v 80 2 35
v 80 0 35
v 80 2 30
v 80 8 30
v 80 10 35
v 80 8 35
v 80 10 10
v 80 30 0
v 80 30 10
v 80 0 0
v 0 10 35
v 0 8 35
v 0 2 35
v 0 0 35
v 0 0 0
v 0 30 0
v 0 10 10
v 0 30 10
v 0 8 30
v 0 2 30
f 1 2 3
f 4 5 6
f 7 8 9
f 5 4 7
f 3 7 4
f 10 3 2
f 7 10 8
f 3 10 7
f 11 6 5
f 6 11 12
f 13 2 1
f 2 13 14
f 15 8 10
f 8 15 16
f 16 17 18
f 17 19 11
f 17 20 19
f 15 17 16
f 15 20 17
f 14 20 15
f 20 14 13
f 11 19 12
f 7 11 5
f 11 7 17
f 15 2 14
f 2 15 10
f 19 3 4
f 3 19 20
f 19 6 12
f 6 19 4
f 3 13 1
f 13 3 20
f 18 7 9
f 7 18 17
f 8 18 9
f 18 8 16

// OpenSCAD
difference(){
    cube([80,10,35]);
    translate([0,2,30]) cube([80,6,6]);
}
cube([80,30,10]);
